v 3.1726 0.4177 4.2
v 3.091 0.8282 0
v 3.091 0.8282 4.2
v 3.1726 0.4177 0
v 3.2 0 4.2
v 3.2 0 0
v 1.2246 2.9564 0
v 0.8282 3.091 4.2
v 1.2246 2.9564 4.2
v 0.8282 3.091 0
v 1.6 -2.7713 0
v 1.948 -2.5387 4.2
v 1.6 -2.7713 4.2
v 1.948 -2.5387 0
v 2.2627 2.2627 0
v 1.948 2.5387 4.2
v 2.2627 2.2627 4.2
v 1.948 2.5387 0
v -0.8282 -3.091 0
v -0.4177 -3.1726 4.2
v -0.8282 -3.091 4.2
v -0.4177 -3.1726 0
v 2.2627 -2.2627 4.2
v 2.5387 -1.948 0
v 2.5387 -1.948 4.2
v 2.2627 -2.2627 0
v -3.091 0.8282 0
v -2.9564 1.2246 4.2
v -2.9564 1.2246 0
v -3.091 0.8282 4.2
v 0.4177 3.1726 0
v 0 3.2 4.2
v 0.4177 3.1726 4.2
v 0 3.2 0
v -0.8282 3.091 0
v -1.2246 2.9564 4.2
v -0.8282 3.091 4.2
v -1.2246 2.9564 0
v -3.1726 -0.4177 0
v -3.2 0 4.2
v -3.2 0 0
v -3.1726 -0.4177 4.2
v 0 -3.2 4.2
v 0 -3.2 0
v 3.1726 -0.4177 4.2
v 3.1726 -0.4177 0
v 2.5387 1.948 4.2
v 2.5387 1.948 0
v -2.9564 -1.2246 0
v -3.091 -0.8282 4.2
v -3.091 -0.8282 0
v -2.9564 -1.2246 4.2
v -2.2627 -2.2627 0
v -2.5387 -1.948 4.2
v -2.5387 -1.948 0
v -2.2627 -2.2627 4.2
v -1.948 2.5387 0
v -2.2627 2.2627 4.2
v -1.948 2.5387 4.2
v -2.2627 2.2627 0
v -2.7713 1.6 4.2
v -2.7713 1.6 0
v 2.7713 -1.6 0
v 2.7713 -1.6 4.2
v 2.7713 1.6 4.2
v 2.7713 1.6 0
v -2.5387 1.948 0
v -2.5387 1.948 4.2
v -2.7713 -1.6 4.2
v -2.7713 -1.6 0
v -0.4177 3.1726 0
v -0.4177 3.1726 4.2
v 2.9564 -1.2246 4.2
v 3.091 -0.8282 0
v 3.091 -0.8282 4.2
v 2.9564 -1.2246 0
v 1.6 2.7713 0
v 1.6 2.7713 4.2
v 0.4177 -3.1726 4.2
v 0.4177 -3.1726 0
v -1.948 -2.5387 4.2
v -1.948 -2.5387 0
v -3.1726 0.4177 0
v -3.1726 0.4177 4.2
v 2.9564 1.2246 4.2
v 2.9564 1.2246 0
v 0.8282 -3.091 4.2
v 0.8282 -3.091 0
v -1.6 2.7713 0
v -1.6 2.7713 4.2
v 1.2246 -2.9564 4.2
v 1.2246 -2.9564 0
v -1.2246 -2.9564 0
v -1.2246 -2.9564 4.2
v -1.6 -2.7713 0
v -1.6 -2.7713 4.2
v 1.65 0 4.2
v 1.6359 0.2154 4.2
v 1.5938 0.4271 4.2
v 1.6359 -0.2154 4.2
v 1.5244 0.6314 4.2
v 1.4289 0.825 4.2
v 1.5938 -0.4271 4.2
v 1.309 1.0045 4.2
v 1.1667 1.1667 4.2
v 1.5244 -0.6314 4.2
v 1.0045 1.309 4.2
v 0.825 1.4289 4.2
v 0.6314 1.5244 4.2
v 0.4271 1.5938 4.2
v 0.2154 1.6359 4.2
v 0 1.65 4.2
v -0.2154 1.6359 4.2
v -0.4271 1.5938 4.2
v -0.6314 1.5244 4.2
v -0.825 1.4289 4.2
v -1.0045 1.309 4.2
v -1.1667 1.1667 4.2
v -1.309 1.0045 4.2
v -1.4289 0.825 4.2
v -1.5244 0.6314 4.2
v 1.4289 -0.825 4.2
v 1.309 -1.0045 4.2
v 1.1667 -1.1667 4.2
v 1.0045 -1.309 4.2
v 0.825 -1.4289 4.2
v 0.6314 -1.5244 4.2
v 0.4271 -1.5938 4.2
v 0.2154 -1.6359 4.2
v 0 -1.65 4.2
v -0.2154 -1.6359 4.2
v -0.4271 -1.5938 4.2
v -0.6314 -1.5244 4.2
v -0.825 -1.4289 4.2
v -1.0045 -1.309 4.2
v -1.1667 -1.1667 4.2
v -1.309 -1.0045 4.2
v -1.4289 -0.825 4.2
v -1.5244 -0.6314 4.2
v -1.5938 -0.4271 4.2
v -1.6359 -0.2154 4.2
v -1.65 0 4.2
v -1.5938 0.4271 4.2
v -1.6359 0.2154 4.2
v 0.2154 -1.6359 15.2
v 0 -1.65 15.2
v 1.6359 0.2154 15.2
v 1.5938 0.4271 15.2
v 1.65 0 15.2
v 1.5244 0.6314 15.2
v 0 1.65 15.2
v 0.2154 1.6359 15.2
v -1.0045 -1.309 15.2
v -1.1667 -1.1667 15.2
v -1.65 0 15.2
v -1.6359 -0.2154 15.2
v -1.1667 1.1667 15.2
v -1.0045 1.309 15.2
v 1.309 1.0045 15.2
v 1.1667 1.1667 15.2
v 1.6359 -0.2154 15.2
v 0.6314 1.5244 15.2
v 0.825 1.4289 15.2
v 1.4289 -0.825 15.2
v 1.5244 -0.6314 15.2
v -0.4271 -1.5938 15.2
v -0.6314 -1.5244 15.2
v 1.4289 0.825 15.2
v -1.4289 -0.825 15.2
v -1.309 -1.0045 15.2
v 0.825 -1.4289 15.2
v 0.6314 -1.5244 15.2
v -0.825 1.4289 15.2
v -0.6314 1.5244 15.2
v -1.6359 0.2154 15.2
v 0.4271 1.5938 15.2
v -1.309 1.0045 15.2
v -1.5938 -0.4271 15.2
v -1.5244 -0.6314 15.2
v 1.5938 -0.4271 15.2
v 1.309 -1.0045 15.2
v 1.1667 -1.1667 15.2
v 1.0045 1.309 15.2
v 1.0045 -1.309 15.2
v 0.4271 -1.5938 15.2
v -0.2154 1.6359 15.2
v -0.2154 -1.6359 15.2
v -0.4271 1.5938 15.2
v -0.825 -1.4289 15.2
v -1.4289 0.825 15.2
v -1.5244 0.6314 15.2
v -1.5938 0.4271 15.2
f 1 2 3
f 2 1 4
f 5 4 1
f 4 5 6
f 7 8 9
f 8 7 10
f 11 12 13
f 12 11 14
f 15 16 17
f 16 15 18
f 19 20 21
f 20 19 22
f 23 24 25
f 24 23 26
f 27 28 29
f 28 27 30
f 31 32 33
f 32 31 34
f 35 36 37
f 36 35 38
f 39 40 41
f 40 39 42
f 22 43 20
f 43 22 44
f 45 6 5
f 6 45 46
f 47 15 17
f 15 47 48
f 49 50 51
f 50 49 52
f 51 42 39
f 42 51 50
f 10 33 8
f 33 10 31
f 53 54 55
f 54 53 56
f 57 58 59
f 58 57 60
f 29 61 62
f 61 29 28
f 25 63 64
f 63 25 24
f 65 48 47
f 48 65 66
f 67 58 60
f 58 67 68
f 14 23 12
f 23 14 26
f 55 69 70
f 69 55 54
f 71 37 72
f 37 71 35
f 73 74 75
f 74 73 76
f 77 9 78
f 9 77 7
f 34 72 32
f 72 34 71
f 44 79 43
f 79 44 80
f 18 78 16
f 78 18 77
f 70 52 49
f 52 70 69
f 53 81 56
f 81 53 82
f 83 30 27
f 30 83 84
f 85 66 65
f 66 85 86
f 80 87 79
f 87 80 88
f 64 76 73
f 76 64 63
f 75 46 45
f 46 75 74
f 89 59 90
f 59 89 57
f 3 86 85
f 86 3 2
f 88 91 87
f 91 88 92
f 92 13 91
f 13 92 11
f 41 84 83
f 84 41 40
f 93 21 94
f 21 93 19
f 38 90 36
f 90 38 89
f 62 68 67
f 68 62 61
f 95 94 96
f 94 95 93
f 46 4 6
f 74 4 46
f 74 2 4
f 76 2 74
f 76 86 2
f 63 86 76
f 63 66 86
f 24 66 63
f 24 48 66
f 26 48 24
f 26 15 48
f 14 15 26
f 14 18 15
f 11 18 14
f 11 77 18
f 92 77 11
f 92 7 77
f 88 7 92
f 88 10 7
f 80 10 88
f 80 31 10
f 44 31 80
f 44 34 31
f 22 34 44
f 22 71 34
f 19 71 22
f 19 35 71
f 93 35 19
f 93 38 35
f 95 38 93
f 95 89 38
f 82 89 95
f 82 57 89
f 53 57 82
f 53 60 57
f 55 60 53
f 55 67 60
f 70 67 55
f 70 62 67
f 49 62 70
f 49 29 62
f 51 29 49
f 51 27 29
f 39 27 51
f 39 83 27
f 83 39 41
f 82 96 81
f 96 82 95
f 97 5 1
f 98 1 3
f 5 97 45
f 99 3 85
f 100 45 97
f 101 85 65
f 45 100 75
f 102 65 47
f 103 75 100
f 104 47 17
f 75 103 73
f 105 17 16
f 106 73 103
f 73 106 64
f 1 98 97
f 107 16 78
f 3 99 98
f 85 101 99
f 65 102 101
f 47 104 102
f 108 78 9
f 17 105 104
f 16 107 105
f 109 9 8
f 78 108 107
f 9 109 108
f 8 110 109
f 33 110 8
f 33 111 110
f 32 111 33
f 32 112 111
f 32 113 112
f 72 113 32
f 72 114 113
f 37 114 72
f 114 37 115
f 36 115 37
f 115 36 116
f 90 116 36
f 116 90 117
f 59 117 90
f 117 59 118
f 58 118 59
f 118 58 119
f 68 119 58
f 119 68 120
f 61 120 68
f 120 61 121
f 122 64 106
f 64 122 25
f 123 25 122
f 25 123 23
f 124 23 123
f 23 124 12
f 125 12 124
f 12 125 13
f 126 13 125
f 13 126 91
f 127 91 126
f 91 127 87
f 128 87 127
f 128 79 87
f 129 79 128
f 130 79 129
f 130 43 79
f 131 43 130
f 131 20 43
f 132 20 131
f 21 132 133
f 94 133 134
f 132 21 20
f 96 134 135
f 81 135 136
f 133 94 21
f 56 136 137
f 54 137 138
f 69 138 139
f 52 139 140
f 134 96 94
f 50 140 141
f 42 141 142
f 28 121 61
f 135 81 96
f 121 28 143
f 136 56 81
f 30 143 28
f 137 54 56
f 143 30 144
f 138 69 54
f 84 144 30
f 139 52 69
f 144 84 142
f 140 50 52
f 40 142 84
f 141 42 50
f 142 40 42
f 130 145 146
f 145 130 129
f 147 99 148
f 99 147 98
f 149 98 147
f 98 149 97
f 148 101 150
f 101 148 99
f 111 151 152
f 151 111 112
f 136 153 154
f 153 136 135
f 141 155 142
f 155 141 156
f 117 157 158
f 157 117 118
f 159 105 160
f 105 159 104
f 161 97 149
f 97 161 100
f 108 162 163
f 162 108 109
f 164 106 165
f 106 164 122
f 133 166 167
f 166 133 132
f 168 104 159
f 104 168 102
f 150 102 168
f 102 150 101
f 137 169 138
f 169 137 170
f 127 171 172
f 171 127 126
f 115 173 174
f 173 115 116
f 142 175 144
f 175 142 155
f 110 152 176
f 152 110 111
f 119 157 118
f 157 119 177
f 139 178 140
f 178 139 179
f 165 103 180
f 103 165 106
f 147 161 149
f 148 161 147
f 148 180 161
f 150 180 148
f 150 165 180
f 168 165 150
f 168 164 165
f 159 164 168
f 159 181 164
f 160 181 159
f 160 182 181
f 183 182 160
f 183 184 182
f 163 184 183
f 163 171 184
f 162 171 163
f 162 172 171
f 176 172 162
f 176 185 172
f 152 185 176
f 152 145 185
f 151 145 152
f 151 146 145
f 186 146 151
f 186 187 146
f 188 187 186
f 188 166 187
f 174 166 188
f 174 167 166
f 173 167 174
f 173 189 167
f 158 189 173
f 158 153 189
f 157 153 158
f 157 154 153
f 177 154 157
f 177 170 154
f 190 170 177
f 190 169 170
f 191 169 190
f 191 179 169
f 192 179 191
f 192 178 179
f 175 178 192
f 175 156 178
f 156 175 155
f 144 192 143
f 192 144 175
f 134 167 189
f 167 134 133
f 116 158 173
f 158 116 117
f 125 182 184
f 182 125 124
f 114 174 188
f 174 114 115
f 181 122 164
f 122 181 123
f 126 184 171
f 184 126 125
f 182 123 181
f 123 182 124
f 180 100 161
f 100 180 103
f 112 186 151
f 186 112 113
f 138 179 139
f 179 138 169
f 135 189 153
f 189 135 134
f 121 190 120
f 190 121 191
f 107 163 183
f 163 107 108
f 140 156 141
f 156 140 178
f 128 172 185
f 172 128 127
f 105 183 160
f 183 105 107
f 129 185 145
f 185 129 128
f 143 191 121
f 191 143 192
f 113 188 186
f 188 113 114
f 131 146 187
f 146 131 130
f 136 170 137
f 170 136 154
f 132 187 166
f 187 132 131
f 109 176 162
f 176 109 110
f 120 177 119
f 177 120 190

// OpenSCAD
//3mmSocketHeadHole.scad - Dr.Gerg's 3mm Socket Head Hole
//
// OpenSCAD definition file
// https://www.drgerg.com
// PARAMETER DEFINITIONS
    cylaH = 4.2;
    cylaD = 6.4;
    cylbH = 12;
    cylbD = 3.3;
module SocHdHole(){
    $fn=48;
    cylinder(cylaH,d=cylaD,false);
    translate([0,0,cylaH-1])
    cylinder(cylbH,d=cylbD,false);
}
SocHdHole();
